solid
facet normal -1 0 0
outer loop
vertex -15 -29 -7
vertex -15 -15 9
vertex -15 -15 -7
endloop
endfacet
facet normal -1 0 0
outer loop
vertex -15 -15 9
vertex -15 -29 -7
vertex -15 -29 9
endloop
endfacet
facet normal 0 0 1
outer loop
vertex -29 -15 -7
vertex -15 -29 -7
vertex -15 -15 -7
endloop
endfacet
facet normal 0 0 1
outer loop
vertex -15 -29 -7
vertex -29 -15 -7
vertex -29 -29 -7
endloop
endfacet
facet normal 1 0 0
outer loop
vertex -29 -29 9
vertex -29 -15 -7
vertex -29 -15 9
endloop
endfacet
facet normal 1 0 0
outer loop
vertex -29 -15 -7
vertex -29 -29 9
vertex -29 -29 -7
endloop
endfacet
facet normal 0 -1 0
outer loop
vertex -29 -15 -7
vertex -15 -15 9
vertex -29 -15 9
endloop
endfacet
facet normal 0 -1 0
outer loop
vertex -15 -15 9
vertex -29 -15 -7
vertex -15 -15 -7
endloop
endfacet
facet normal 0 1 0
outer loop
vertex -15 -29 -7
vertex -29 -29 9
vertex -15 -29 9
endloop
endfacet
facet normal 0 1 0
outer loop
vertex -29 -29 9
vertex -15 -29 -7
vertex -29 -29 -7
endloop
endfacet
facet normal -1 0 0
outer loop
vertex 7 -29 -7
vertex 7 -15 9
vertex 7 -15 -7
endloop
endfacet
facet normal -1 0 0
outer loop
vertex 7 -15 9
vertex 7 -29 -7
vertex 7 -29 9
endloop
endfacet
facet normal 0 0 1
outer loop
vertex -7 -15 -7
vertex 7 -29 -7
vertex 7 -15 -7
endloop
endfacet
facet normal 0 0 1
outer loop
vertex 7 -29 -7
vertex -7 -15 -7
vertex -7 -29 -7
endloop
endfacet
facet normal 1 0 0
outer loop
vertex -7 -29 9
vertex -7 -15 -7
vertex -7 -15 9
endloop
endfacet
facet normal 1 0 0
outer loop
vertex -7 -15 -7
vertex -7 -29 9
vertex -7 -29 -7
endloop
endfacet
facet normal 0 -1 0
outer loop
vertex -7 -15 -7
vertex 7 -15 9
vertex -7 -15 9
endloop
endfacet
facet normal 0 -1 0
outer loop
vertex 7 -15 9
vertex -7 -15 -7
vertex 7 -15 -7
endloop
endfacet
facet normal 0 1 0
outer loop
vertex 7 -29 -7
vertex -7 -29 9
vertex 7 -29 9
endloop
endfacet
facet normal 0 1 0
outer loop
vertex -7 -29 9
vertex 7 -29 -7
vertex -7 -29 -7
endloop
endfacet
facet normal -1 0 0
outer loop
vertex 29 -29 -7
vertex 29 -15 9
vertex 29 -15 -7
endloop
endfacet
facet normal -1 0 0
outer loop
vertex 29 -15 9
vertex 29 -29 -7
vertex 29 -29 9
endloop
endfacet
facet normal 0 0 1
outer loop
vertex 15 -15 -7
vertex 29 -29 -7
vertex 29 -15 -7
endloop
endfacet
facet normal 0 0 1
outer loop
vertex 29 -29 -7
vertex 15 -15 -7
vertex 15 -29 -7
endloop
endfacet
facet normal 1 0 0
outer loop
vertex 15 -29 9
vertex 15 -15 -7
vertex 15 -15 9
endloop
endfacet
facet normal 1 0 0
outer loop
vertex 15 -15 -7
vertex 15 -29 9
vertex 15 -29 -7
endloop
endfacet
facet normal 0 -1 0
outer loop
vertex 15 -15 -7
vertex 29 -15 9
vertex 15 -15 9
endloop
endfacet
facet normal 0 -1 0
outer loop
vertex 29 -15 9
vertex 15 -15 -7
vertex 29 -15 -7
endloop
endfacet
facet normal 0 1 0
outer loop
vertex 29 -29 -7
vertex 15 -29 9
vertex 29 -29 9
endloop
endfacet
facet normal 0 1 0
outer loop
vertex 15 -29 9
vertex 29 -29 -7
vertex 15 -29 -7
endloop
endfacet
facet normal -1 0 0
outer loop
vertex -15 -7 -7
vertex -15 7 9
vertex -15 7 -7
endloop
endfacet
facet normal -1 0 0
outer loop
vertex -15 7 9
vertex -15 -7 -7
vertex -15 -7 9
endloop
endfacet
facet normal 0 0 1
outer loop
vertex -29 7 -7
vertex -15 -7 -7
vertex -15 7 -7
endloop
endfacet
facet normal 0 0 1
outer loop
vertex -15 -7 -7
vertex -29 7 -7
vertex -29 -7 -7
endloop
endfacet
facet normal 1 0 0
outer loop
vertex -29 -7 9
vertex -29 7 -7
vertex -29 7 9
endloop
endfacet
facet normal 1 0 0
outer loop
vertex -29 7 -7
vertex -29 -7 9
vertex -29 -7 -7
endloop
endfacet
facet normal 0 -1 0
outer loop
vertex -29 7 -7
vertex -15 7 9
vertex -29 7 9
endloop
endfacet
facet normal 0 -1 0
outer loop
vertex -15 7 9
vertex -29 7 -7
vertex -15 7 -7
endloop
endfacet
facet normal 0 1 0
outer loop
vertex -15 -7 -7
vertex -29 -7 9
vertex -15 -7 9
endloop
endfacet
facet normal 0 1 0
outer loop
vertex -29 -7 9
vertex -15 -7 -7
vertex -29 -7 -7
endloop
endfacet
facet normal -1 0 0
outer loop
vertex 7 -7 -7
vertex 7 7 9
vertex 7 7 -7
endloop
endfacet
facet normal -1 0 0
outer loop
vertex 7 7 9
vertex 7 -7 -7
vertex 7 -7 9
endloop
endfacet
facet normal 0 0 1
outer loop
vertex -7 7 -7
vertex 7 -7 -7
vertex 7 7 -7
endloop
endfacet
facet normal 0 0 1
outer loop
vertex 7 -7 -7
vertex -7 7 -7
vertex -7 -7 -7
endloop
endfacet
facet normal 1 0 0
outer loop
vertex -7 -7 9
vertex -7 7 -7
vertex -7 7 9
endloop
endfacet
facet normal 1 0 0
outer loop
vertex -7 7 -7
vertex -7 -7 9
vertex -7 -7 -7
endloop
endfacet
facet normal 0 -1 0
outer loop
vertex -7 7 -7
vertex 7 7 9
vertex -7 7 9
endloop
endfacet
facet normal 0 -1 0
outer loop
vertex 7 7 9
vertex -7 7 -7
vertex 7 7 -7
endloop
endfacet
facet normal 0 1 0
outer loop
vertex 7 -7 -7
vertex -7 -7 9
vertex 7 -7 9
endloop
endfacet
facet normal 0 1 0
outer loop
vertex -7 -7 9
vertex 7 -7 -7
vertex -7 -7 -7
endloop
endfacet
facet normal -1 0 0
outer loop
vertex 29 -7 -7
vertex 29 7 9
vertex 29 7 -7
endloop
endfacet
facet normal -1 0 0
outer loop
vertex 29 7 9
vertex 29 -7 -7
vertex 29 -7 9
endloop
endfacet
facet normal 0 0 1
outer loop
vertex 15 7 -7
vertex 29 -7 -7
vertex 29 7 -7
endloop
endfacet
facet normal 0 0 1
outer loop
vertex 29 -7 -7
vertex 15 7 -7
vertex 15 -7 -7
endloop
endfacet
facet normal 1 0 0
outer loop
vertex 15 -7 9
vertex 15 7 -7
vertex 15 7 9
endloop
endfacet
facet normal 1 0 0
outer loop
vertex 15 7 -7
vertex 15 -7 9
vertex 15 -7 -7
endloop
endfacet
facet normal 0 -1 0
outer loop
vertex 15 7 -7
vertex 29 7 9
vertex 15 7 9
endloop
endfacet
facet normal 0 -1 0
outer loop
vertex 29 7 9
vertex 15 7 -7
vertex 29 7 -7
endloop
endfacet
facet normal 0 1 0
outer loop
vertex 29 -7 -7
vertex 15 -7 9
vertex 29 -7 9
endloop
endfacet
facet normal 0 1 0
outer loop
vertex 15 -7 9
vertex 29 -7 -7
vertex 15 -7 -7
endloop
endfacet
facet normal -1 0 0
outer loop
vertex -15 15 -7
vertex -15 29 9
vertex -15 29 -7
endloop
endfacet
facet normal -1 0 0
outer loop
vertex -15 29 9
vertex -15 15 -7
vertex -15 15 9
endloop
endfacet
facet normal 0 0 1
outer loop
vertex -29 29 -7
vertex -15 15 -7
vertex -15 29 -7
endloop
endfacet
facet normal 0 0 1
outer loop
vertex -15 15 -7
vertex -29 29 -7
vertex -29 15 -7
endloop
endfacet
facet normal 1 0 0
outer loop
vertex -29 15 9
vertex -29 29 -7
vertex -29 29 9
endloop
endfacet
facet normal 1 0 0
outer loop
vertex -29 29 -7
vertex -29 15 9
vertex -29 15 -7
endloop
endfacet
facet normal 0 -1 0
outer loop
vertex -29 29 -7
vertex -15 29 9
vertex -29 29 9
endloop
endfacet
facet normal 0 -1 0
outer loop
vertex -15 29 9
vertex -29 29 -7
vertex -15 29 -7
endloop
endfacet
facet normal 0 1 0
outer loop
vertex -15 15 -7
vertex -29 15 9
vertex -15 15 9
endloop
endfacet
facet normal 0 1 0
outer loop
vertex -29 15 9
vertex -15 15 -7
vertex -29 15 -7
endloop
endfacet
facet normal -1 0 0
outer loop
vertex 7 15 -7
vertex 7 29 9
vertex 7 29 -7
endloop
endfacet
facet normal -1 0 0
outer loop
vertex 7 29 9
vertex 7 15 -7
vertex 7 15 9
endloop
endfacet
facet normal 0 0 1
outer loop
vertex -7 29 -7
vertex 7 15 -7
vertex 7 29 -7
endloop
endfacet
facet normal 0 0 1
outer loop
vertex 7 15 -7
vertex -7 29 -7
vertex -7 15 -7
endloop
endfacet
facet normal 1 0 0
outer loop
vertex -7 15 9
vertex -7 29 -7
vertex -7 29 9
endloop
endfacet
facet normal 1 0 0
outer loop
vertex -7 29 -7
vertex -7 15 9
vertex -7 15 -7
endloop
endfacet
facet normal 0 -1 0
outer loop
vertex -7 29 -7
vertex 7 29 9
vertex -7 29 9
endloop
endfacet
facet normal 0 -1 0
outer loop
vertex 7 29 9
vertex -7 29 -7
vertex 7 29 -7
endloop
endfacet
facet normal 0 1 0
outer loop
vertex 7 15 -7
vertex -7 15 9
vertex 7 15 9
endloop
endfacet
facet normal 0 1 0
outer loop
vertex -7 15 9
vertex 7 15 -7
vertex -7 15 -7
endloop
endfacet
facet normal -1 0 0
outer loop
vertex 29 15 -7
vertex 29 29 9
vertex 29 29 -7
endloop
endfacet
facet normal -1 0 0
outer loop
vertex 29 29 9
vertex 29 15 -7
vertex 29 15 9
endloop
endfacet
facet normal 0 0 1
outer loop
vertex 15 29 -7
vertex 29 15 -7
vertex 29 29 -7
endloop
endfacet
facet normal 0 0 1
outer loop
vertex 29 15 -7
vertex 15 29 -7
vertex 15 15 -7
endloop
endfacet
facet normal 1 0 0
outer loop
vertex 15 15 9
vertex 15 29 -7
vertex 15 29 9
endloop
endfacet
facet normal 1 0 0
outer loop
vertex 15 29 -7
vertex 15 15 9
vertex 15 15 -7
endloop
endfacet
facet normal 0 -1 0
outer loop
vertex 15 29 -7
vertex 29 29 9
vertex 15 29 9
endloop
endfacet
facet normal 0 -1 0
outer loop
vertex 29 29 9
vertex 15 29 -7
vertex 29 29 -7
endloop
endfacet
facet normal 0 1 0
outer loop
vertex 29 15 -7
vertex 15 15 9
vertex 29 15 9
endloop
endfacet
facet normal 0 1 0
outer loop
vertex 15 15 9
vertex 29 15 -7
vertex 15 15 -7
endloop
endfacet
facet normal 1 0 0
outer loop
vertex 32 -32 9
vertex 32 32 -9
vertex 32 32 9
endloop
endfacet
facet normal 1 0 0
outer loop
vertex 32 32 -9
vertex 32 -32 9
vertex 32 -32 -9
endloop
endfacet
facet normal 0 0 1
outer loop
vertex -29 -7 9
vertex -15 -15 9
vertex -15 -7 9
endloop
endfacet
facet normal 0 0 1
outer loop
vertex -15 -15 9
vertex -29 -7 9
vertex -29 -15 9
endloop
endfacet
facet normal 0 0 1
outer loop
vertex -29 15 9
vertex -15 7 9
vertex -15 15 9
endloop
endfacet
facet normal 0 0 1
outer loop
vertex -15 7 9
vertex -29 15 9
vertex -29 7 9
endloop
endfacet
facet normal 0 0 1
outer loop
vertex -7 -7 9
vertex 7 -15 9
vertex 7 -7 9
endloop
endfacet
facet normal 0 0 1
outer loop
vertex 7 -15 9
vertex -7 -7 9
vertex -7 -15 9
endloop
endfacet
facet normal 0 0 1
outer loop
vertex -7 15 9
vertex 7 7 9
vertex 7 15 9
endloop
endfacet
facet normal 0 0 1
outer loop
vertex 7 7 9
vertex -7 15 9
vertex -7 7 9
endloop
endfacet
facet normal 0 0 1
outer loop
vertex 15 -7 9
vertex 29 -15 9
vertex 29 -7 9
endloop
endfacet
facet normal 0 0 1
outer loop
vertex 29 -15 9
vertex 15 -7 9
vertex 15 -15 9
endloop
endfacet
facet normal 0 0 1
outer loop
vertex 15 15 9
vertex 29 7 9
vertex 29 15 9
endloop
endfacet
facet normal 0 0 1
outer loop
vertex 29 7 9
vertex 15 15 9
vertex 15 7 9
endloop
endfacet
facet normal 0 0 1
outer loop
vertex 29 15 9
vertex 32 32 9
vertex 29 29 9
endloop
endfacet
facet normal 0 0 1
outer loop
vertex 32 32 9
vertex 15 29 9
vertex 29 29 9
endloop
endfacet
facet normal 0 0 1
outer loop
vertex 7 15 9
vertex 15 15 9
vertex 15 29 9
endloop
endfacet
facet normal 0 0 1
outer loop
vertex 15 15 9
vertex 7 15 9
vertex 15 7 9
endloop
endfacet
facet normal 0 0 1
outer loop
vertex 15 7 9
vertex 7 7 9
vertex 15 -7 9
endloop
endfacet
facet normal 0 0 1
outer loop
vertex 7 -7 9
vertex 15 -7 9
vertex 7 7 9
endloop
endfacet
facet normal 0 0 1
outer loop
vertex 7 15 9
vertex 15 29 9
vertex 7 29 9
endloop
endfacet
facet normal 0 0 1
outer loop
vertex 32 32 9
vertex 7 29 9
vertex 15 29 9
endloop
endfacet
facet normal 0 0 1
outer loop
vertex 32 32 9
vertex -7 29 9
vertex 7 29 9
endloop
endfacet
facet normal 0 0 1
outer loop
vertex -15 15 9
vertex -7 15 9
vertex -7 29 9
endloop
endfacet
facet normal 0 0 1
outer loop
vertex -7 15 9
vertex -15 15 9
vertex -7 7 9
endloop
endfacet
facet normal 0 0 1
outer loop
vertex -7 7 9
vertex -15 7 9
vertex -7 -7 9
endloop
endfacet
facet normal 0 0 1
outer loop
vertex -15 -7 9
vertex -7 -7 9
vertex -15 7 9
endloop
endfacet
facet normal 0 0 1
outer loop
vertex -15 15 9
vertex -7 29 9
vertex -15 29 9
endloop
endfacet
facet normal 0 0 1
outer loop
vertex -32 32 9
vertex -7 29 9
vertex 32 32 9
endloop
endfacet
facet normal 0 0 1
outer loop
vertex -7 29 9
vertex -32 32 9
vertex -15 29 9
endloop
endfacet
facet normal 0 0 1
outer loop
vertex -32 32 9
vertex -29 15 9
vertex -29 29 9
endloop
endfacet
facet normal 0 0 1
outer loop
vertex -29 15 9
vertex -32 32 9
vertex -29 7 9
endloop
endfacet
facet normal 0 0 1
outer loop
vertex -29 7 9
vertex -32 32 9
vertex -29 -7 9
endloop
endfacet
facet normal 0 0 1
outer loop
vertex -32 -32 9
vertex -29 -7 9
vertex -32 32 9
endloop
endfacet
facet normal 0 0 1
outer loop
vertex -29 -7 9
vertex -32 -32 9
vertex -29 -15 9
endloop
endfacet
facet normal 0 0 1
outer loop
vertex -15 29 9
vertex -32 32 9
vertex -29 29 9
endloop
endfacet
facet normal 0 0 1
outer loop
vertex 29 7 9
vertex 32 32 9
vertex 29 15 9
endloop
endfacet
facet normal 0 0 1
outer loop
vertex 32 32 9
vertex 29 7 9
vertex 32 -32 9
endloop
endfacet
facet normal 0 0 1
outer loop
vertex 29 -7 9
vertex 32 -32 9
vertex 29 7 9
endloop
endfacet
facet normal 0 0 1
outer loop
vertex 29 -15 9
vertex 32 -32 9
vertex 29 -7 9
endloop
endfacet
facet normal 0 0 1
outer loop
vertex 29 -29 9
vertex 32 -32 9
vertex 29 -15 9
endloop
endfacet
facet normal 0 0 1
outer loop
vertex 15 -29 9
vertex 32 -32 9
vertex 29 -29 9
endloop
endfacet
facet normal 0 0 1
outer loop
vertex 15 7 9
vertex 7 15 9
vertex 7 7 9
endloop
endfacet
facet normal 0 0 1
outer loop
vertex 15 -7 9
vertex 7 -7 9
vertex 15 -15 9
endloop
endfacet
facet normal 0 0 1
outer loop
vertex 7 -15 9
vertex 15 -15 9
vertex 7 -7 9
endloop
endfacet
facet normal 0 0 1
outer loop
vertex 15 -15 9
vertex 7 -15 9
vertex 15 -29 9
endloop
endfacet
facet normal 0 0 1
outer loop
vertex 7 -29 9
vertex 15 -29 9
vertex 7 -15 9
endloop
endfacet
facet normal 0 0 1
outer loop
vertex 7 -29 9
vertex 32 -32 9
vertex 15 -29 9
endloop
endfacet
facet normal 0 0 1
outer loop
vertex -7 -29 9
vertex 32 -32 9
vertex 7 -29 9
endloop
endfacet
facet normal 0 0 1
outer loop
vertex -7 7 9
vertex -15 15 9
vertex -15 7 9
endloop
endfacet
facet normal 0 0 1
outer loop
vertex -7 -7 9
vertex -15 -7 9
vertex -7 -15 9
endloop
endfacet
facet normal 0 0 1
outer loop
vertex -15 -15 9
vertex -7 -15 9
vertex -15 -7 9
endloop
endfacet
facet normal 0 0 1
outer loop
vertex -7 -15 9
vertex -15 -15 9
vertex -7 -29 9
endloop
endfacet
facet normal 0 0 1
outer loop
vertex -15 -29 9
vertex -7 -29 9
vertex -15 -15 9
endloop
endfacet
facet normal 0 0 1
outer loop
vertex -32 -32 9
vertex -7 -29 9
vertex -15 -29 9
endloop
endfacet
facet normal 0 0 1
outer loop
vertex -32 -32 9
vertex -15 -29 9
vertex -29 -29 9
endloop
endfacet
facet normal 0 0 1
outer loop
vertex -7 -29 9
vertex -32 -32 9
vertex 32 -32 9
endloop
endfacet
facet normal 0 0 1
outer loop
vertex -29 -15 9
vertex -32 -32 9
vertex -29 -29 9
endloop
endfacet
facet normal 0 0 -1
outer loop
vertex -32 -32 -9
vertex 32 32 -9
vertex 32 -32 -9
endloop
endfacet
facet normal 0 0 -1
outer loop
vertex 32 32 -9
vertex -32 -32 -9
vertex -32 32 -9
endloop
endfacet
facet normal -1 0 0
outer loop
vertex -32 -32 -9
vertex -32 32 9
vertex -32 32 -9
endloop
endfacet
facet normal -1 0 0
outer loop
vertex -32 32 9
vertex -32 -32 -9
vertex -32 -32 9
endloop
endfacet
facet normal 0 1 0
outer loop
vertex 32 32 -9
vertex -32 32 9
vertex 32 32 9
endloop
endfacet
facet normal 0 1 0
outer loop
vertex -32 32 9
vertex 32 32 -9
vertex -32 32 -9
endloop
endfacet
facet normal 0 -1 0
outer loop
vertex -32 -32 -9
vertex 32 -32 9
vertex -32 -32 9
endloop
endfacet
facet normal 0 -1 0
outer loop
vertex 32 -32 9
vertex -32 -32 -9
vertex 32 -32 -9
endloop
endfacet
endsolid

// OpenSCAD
$fn = 32;

// ----------------------------------------------------------------------
// Pocket plate 64 x 64 x 18
// 3 x 3 pockets 14 mm square, 16 mm deep
// ----------------------------------------------------------------------

// --- parameters (mm) ---
thickness = 18;  // plate thickness
floor_t = 2;     // material left under each pocket
pocket = 14;     // pocket side length
pitch_x = 22;    // pocket pitch along X
pitch_y = 22;    // pocket pitch along Y
cols = 3;        // pockets per row
rows = 3;        // rows of pockets

// --- derived feature positions (mm) ---
depth = thickness - floor_t;        // = 16   pocket depth, down to the floor
span_x = (cols - 1) * pitch_x;      // = 44   distance between outer pockets
span_y = (rows - 1) * pitch_y;      // = 44   distance between outer pocket rows
origin_x = -span_x / 2;             // = -22   X of the first pocket
origin_y = -span_y / 2;             // = -22   Y of the first pocket
plate = [span_x + pocket + 6, span_y + pocket + 6, thickness];  // = [64, 64, 18]   overall size: pockets plus 3 mm of wall on each side
feature_centers = [
  [origin_x + 0 * pitch_x, origin_y + 0 * pitch_y],
  [origin_x + 1 * pitch_x, origin_y + 0 * pitch_y],
  [origin_x + 2 * pitch_x, origin_y + 0 * pitch_y],
  [origin_x + 0 * pitch_x, origin_y + 1 * pitch_y],
  [origin_x + 1 * pitch_x, origin_y + 1 * pitch_y],
  [origin_x + 2 * pitch_x, origin_y + 1 * pitch_y],
  [origin_x + 0 * pitch_x, origin_y + 2 * pitch_y],
  [origin_x + 1 * pitch_x, origin_y + 2 * pitch_y],
  [origin_x + 2 * pitch_x, origin_y + 2 * pitch_y]
];   // pocket centres, used verbatim by the cutter loop

// plate outline, then one pocket per centre in feature_centers
difference() {
  cube(plate, center = true);
  for (centre = feature_centers)
    translate([centre[0] - pocket / 2, centre[1] - pocket / 2, plate[2] / 2 - depth])
      cube([pocket, pocket, depth + 1]);  // centred on the declared pocket centre
}
